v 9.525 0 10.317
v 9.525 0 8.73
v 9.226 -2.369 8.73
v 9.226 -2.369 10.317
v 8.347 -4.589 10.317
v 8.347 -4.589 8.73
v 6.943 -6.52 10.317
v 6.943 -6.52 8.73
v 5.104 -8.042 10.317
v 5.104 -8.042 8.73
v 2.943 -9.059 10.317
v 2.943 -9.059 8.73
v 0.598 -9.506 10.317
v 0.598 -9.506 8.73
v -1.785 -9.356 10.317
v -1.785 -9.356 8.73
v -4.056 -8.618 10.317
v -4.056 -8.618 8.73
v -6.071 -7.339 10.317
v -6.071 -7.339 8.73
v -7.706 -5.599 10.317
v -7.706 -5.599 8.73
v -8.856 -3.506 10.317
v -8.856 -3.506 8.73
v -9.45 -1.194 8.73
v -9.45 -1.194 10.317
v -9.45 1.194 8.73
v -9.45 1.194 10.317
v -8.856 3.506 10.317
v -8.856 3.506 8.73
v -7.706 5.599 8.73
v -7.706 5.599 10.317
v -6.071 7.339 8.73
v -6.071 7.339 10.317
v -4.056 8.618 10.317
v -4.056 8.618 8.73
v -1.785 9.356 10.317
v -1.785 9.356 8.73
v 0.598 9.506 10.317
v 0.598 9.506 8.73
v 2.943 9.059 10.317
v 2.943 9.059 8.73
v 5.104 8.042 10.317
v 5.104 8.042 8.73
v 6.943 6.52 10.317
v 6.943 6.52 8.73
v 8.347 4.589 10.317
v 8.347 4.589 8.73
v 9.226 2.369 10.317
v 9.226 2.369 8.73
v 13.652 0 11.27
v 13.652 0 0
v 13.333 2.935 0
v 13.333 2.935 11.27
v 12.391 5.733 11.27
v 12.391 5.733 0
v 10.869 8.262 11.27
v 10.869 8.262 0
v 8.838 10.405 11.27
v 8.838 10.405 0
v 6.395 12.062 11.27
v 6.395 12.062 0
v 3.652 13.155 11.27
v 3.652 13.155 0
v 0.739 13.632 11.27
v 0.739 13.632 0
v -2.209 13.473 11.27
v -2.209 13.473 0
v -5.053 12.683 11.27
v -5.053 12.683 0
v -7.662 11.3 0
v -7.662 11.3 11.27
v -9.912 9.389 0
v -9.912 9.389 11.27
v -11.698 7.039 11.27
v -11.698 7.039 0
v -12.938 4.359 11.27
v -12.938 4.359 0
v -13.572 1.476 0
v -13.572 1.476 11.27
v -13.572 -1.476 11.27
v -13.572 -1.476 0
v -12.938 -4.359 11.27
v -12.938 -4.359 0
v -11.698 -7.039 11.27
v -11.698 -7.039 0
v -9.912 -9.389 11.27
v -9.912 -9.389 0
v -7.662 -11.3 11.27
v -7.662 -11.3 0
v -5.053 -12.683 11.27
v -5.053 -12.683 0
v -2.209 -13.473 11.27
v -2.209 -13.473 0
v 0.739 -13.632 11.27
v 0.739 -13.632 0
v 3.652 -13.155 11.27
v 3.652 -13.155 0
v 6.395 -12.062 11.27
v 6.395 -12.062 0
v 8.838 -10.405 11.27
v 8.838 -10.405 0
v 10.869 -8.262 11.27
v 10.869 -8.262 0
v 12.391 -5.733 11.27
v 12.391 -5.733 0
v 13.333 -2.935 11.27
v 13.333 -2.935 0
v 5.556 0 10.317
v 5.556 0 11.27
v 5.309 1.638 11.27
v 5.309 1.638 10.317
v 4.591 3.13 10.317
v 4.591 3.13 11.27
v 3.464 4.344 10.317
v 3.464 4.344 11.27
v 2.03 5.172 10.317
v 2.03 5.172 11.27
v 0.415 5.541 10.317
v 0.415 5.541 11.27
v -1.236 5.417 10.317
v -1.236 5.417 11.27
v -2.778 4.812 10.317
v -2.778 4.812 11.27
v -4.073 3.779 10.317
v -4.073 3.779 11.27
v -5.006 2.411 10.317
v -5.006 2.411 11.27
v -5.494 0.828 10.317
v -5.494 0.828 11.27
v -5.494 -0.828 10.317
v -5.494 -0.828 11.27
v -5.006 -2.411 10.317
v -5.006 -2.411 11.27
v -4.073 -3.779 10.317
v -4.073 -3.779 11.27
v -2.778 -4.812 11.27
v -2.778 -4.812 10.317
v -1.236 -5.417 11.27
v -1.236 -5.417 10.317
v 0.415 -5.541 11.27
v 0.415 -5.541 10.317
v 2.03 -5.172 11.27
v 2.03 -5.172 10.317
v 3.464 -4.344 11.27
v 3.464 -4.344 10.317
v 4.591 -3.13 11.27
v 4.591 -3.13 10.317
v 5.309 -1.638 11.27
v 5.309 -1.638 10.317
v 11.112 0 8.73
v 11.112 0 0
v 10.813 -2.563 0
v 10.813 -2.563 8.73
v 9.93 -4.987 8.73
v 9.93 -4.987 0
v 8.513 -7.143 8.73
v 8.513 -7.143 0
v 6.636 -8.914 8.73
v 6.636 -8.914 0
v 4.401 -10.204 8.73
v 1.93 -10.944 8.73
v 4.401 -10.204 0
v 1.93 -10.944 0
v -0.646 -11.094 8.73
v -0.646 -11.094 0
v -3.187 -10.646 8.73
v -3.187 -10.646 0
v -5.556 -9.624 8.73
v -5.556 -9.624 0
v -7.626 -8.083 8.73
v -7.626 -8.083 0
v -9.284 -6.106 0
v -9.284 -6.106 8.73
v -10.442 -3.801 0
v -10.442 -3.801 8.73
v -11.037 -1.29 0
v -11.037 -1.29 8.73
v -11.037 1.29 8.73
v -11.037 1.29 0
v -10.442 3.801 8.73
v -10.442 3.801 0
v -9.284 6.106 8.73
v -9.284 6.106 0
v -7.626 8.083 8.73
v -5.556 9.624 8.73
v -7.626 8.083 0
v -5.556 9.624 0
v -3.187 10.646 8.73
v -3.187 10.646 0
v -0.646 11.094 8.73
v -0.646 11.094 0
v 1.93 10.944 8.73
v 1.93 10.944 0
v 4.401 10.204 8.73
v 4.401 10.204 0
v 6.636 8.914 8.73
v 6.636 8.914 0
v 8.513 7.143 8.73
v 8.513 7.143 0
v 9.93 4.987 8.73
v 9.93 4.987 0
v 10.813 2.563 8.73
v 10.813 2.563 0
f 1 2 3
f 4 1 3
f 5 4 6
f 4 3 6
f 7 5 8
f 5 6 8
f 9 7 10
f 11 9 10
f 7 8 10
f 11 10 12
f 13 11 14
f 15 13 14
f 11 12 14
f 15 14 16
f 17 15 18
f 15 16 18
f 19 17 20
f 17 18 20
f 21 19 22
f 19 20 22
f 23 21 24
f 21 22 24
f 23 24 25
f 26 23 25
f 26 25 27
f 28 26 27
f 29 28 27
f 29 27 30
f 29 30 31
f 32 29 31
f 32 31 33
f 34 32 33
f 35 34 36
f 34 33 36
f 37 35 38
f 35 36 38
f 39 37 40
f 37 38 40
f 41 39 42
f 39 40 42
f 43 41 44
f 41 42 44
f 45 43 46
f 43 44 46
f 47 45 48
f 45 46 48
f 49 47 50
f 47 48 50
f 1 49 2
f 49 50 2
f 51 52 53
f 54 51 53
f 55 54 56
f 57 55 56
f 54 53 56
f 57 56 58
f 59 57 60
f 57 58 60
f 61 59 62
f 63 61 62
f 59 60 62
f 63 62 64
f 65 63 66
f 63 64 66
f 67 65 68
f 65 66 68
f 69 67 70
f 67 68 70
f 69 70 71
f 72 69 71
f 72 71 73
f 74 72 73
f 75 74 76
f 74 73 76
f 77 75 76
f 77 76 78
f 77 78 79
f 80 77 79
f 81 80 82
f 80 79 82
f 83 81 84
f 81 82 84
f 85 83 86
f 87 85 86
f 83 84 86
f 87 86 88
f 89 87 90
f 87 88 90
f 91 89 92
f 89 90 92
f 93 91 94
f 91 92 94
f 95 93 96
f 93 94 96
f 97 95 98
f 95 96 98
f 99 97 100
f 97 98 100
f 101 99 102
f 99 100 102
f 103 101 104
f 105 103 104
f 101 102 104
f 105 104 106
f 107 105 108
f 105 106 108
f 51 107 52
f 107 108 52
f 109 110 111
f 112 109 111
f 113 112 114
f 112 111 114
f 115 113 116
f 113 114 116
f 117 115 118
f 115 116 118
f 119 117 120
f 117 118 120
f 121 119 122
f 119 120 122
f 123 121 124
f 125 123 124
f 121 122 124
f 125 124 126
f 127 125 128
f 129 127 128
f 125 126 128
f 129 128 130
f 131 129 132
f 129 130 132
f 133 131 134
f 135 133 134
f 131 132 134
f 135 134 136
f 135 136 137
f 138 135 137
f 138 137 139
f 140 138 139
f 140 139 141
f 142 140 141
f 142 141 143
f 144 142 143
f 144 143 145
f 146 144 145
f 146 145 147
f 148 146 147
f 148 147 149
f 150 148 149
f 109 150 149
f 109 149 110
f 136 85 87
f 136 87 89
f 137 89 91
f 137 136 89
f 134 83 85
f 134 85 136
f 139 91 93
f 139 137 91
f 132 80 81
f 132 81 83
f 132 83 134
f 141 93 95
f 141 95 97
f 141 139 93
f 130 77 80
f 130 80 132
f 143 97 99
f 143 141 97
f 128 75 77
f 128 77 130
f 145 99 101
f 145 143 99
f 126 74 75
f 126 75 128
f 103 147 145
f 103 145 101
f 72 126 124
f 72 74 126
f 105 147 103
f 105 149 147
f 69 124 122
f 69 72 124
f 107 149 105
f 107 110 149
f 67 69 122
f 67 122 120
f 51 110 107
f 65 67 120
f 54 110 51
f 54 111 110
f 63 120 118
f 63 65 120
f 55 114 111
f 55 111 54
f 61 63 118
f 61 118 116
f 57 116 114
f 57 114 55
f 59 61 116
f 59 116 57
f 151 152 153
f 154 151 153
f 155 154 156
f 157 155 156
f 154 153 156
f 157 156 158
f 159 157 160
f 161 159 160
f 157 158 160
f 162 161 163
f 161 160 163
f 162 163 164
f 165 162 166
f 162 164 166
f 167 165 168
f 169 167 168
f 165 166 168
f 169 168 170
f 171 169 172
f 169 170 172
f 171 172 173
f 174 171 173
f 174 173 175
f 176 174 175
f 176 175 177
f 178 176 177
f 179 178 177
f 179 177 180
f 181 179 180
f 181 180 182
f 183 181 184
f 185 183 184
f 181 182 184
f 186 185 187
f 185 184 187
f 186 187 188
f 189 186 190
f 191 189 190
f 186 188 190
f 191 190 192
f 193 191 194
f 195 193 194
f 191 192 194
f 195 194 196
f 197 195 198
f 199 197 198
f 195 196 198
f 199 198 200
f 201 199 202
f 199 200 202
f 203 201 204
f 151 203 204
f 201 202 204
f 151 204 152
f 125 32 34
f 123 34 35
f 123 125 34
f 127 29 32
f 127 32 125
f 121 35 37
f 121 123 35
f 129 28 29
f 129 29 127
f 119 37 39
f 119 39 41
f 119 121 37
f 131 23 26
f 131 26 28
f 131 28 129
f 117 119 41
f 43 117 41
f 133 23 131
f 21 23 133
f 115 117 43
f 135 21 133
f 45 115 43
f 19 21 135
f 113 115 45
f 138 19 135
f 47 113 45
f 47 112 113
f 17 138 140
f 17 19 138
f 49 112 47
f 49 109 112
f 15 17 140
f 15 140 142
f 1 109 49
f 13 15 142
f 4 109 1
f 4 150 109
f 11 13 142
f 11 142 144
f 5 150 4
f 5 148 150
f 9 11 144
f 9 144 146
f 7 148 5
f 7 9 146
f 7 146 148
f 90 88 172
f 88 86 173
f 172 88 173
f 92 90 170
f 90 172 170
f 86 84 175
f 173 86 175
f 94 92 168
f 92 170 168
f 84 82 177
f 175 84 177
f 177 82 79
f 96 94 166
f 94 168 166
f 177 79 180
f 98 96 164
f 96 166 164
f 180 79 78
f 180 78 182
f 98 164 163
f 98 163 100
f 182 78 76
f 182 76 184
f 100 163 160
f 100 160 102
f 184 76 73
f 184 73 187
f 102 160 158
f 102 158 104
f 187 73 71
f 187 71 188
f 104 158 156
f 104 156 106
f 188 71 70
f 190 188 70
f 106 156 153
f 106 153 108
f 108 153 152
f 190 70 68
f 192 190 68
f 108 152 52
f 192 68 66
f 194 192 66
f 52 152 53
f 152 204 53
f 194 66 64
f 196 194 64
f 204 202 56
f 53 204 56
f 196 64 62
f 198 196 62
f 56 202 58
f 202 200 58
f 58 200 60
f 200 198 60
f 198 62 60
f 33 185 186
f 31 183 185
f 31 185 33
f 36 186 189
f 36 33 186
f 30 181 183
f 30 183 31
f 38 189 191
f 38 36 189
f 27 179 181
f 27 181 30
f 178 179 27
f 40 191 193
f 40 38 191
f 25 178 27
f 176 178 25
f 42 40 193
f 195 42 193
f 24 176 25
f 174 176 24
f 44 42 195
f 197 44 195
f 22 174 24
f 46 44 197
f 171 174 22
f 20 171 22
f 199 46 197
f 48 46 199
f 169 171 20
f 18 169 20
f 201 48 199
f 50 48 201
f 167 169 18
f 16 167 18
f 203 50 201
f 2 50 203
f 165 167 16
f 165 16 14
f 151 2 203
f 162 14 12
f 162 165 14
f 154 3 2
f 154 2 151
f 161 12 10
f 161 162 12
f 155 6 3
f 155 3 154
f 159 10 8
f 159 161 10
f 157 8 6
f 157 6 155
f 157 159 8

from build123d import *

# Parameters (mm, degrees)
F0_R     = 13.6525
F1_DEPTH = 11.26998
F2_R     = 11.1125
F3_DEPTH = 8.72998
F4_R     = 9.525
F5_DEPTH = 1.5875
F6_R     = 5.55625
F7_DEPTH = 11.27098


with BuildPart() as f1:
    # F0 (on Top) → F1 (new body)
    with BuildSketch(Plane.XY):
        Circle(F0_R)
    extrude(amount=F1_DEPTH)

    # F2 (on face) → F3 (cut)
    with BuildSketch(Plane(origin=(0, 0, 0), x_dir=(1, 0, 0), z_dir=(0, 0, -1))):
        Circle(F2_R)
    extrude(amount=-F3_DEPTH, mode=Mode.SUBTRACT)

    # F4 (on face) → F5 (cut)
    with BuildSketch(Plane(origin=(0, 0, 8.72998), x_dir=(1, 0, 0), z_dir=(0, 0, -1))):
        Circle(F4_R)
    extrude(amount=-F5_DEPTH, mode=Mode.SUBTRACT)

    # F6 (on face) → F7 (cut, through all)
    with BuildSketch(Plane.XY.offset(11.26998)):
        Circle(F6_R)
    extrude(amount=-F7_DEPTH, mode=Mode.SUBTRACT)


solid = f1.part
